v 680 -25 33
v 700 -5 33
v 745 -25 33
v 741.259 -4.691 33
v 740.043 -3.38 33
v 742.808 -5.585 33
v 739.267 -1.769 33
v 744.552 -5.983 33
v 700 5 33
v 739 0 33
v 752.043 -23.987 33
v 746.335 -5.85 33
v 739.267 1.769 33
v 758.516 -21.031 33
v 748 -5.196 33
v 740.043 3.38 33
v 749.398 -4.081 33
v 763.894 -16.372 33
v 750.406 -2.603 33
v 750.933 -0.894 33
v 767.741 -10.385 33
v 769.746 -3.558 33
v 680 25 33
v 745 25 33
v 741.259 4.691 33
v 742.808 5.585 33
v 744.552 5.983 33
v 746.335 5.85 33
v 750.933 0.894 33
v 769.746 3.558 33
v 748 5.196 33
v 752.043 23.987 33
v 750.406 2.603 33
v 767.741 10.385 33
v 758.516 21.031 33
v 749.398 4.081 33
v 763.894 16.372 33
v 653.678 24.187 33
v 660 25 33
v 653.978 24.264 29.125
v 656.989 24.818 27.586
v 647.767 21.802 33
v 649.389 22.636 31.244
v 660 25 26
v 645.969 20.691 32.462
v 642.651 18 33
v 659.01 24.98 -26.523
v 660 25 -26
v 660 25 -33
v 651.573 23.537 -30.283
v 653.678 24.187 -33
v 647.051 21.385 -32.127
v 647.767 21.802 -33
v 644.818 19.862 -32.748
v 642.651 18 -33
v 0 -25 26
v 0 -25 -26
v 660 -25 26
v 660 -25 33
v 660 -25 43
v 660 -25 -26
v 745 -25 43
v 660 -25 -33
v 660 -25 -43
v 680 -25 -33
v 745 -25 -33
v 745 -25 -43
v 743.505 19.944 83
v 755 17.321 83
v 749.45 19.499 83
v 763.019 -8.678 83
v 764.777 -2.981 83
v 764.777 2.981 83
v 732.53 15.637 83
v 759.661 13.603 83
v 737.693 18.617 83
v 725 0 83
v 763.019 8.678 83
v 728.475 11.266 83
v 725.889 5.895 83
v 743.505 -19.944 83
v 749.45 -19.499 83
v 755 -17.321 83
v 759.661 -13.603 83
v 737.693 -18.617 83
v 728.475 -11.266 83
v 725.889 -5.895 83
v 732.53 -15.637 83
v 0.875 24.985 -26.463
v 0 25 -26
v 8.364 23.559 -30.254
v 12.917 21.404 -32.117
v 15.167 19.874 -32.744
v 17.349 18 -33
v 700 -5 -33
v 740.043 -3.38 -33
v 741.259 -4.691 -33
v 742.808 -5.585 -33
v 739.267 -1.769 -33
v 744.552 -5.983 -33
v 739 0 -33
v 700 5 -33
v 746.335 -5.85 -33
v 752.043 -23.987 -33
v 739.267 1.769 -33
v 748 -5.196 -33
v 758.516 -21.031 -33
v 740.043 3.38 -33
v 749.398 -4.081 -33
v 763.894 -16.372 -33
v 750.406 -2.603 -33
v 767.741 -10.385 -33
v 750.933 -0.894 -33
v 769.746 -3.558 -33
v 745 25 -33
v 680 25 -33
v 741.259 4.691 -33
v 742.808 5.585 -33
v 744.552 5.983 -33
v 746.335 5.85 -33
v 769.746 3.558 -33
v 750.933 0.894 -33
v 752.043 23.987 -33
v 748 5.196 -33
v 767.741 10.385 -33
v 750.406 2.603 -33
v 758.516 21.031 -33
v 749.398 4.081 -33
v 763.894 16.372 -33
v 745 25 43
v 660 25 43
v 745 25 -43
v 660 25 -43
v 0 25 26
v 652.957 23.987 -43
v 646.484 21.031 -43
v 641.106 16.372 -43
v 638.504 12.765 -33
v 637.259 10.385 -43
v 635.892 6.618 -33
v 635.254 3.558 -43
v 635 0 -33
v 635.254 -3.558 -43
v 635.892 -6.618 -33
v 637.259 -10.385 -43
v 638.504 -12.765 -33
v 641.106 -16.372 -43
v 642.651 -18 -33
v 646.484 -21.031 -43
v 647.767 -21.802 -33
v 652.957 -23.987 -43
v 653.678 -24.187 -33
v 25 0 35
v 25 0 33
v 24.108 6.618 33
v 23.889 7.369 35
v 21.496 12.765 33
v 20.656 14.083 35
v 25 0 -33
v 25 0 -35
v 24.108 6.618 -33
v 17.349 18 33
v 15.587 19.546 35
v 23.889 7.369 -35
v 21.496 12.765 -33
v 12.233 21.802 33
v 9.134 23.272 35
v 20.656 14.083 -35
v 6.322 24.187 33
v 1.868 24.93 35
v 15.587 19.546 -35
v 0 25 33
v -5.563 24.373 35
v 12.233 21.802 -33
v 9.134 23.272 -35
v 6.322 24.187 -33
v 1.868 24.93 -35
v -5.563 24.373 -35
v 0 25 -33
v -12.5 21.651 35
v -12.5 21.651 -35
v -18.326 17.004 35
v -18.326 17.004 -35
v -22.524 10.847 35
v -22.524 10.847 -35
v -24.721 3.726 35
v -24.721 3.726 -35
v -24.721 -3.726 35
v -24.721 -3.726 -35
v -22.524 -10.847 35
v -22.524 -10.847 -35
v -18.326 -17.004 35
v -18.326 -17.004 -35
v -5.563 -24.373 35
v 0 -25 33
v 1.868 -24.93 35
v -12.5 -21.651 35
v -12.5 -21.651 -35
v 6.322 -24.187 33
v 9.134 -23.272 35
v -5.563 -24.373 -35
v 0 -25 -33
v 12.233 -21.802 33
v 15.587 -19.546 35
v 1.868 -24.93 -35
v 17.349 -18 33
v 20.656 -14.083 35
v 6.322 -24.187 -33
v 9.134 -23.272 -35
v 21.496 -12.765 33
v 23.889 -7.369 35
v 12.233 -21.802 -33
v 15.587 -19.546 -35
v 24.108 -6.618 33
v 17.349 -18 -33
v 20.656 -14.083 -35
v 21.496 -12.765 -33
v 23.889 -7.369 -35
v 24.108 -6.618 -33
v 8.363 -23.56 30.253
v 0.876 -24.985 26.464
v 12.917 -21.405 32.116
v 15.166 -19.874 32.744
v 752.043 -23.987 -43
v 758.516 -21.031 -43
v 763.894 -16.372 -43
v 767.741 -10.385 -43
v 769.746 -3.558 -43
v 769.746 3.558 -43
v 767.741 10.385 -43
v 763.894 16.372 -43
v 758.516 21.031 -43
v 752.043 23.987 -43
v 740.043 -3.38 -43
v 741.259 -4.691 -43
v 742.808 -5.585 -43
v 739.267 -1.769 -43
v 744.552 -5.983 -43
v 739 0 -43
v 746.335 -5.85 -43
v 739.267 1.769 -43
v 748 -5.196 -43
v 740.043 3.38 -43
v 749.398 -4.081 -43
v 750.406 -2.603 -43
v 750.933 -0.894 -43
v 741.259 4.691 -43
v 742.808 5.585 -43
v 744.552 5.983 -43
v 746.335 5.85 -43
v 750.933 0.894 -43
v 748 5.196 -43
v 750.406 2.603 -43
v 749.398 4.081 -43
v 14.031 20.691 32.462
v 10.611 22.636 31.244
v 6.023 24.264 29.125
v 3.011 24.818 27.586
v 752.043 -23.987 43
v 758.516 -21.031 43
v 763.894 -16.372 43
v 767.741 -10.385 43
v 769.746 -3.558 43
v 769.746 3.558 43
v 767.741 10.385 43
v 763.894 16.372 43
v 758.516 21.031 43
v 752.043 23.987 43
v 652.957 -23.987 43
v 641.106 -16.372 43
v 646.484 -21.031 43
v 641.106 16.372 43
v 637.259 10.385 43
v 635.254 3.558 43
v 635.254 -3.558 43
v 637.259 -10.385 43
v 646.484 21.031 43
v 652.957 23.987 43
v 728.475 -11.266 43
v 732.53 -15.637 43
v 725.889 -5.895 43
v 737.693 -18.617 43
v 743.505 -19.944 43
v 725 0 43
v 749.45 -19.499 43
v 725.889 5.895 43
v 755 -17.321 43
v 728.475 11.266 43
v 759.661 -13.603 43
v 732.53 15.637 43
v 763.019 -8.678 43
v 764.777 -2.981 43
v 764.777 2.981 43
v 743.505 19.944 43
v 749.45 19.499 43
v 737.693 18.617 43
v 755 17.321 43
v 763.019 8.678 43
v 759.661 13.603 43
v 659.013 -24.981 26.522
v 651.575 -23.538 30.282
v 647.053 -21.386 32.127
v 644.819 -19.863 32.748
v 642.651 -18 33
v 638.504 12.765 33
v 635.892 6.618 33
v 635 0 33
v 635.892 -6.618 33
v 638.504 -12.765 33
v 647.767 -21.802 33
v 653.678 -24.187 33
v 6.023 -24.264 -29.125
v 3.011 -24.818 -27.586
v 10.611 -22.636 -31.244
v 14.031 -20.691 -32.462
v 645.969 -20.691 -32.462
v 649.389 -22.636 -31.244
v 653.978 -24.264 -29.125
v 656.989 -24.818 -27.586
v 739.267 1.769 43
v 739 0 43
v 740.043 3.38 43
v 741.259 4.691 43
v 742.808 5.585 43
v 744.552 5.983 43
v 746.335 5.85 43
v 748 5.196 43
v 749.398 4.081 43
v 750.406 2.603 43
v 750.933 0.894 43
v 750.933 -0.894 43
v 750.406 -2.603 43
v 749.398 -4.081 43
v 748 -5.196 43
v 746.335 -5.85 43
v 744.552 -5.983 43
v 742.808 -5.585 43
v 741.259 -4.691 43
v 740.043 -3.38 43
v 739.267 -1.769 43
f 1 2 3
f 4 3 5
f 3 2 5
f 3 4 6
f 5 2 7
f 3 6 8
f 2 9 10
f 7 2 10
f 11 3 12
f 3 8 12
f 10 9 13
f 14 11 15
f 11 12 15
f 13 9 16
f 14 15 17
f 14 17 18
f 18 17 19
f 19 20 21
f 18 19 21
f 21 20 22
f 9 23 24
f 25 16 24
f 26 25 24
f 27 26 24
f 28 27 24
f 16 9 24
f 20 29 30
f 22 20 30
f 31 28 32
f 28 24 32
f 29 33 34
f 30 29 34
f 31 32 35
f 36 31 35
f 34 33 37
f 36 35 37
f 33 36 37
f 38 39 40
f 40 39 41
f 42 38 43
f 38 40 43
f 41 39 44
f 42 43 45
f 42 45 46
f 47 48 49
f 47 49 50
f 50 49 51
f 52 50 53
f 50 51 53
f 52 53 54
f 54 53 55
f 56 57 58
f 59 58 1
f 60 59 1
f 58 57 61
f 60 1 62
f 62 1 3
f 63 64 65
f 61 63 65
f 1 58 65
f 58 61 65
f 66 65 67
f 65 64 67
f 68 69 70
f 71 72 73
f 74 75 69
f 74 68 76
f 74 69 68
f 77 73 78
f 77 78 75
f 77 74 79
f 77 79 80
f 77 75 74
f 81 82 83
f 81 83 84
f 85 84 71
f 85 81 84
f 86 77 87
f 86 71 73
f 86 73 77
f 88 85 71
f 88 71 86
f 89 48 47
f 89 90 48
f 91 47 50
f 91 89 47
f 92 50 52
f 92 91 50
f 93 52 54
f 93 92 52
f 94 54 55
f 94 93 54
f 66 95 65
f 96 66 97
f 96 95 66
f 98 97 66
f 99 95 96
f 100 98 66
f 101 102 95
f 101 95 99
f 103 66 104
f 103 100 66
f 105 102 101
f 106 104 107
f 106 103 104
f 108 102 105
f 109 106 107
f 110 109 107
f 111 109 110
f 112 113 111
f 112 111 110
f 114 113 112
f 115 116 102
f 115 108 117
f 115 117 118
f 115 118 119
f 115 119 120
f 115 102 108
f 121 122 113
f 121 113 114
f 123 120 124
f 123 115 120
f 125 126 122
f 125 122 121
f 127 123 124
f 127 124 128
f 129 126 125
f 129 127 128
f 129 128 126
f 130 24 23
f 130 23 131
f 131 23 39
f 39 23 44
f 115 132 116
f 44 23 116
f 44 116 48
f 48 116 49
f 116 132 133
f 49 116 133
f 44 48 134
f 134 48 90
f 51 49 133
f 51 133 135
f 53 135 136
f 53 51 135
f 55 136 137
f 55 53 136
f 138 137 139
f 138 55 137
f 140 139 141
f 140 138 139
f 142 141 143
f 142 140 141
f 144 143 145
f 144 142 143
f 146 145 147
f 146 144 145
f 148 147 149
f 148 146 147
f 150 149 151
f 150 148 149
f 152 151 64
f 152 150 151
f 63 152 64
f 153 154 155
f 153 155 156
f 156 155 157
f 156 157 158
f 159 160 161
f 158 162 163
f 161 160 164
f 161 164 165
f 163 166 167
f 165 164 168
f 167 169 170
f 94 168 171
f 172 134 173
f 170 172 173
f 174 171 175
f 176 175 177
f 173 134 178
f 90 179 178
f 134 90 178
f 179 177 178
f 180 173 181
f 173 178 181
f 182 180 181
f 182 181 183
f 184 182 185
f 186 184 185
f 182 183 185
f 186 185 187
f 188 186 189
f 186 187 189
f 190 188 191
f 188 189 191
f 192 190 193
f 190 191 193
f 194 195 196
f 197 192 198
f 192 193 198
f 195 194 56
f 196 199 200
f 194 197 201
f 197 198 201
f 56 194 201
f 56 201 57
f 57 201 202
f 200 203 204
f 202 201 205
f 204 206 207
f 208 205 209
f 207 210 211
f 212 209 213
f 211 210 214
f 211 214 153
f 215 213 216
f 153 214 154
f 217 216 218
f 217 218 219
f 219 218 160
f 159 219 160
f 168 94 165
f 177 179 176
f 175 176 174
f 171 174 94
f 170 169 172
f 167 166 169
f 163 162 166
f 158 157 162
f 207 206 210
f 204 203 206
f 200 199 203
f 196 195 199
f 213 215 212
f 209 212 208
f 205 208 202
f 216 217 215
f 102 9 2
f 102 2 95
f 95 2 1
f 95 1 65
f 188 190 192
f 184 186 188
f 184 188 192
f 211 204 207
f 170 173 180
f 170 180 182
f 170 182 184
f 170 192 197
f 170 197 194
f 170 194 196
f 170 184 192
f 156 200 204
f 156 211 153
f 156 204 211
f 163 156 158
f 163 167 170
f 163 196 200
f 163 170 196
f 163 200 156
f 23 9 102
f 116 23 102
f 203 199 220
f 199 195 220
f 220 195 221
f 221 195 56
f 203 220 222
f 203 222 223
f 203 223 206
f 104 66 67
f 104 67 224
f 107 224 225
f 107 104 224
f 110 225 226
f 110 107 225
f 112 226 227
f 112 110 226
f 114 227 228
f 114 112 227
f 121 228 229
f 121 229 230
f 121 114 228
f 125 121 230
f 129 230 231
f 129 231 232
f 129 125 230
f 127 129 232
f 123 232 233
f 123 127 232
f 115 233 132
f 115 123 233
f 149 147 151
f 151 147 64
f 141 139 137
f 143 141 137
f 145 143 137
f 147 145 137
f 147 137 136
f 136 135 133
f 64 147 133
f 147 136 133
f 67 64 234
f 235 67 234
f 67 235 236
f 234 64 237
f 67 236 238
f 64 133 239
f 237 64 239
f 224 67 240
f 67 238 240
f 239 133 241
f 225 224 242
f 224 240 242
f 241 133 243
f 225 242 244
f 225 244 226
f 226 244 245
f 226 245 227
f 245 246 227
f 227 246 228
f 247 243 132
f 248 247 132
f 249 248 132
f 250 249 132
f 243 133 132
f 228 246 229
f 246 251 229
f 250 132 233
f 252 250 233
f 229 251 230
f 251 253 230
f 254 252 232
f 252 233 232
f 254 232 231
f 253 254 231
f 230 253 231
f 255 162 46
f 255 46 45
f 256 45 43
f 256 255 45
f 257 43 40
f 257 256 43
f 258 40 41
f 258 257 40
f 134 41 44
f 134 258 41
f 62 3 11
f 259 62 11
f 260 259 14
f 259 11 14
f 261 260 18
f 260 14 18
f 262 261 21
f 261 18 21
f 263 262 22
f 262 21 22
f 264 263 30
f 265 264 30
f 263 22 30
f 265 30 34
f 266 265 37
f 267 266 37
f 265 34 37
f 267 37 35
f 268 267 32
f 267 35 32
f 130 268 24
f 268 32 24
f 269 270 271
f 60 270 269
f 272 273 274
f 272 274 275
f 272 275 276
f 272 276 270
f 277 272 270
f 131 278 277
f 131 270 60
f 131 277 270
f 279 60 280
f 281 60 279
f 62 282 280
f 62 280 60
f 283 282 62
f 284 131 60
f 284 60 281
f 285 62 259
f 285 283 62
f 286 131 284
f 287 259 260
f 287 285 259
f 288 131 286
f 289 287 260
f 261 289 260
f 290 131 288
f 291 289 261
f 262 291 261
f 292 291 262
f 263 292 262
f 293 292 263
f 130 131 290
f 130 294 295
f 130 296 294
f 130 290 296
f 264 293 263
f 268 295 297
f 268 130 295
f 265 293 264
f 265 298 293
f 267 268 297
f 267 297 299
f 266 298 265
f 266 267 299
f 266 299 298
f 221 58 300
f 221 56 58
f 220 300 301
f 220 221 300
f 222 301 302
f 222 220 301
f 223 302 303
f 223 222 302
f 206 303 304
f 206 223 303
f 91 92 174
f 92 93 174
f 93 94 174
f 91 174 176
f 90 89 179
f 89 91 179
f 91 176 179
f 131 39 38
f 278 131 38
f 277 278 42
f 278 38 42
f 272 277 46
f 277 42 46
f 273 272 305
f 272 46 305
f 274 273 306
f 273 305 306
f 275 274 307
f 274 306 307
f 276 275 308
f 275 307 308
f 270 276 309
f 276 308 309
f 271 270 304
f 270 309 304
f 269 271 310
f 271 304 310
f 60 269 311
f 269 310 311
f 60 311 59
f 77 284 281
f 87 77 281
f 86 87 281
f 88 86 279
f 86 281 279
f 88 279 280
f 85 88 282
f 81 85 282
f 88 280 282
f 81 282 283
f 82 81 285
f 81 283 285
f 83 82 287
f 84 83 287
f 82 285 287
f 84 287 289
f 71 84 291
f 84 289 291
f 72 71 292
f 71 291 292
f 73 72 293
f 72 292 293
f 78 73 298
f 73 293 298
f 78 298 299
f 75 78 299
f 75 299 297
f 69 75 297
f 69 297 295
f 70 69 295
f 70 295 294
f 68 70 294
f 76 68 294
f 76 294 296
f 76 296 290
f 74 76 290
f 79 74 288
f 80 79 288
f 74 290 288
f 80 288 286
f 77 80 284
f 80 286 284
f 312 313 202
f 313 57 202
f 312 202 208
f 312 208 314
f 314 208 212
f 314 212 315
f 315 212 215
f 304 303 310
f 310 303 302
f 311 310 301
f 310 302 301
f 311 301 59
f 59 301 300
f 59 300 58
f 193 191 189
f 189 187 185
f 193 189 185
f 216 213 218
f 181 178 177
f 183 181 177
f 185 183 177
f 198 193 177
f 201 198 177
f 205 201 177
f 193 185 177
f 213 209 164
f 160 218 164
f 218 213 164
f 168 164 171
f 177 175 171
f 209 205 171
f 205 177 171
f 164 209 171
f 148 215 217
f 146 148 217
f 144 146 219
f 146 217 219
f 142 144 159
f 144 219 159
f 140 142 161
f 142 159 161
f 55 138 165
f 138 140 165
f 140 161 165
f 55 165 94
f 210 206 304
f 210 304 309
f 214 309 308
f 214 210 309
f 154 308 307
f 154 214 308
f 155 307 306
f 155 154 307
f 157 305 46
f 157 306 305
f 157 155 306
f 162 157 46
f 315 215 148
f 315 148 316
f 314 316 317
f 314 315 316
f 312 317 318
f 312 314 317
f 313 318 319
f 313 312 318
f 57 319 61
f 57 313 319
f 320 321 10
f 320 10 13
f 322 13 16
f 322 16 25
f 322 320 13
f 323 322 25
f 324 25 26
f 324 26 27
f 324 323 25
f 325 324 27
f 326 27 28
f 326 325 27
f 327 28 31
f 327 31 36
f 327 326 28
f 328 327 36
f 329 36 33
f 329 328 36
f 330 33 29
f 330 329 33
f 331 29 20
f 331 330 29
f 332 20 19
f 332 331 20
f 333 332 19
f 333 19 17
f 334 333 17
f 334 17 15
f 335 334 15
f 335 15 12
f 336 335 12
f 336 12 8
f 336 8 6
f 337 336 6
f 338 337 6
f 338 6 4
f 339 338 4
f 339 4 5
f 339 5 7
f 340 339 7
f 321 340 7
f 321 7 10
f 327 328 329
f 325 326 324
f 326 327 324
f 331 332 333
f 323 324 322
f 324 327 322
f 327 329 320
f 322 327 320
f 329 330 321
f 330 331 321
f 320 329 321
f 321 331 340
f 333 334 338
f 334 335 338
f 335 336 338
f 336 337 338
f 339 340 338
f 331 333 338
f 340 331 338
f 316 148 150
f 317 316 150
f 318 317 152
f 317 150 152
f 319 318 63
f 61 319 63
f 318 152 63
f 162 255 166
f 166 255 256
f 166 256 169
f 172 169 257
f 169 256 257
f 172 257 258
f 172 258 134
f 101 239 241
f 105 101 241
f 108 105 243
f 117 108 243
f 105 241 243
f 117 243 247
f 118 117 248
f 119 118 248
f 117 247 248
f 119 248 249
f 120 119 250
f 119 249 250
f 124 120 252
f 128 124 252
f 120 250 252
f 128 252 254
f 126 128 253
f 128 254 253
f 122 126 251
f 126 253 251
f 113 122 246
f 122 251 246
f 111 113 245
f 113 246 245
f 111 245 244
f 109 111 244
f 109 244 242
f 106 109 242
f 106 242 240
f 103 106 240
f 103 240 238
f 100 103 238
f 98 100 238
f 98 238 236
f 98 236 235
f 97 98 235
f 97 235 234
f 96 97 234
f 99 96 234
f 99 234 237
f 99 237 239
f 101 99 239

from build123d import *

# Parameters (mm, degrees)
AUFSATZ_LINEAR_AUSTRAGEN1_DEPTH      = 35
AUFSATZ_LINEAR_AUSTRAGEN1_DEPTH_BACK = 35
SKIZZE1_R                            = 25
SKIZZE2_W                            = 66
SKIZZE2_H                            = 50
AUFSATZ_LINEAR_AUSTRAGEN2_DEPTH      = 700
AUFSATZ_LINEAR_AUSTRAGEN3_DEPTH      = 10
SCHNITT_LINEAR_AUSTRAGEN1_REACH      = 776.344
SKIZZE4_R                            = 6
VERRUNDUNG2_START                    = -1e-07
VERRUNDUNG2_DEPTH                    = 660.0000001
VERRUNDUNG2_START_2                  = -33
VERRUNDUNG2_2_DEPTH                  = 66
FASE1_SIZE                           = 20
SKIZZE5_R                            = 20
AUFSATZ_LINEAR_AUSTRAGEN4_DEPTH      = 40


with BuildPart() as part:
    # Skizze1 → Aufsatz-Linear austragen1 (new, two sides: drawn at the far end of the back side and taken through both)
    with BuildSketch(Plane.XY.offset(-AUFSATZ_LINEAR_AUSTRAGEN1_DEPTH_BACK)):
        Circle(SKIZZE1_R)
    extrude(amount=AUFSATZ_LINEAR_AUSTRAGEN1_DEPTH + AUFSATZ_LINEAR_AUSTRAGEN1_DEPTH_BACK)

    # Skizze2 → Aufsatz-Linear austragen2 (add)
    with BuildSketch(Plane(origin=(0, 0, 0), x_dir=(0, 0, -1), z_dir=(1, 0, 0))):
        Rectangle(SKIZZE2_W, SKIZZE2_H)
    extrude(amount=AUFSATZ_LINEAR_AUSTRAGEN2_DEPTH)

    # Skizze3 → Aufsatz-Linear austragen3 (add)
    with BuildSketch(Plane(origin=(0, 0, -33), x_dir=(-1, 0, 0), z_dir=(0, 0, -1))):
        with BuildLine():
            Line((-700, 25), (-660, 25))
            ThreePointArc((-660, 25), (-635, 0), (-660, -25))
            Line((-660, -25), (-700, -25))
            Line((-700, -25), (-745, -25))
            ThreePointArc((-745, -25), (-770, 0), (-745, 25))
            Line((-745, 25), (-700, 25))
        make_face()
    aufsatz_linear_austragen3 = extrude(amount=AUFSATZ_LINEAR_AUSTRAGEN3_DEPTH)

    # Skizze4 → Schnitt-Linear austragen1 (cut, up to next)
    with BuildSketch(Plane(origin=(0, 0, -43), x_dir=(-1, 0, 0), z_dir=(0, 0, -1)), mode=Mode.PRIVATE) as schnitt_linear_austragen1_sk1:
        with Locations((-745, 0)):
            Circle(SKIZZE4_R)
    schnitt_linear_austragen1_tool1 = extrude(schnitt_linear_austragen1_sk1.sketch, amount=-SCHNITT_LINEAR_AUSTRAGEN1_REACH, mode=Mode.PRIVATE) & part.part
    schnitt_linear_austragen1 = schnitt_linear_austragen1_tool1.solids().sort_by_distance((745, 0, -43))[0]
    add(schnitt_linear_austragen1, mode=Mode.SUBTRACT)

    # Spiegeln1: Aufsatz-Linear austragen3, Schnitt-Linear austragen1 across plane
    add(aufsatz_linear_austragen3.mirror(Plane.XY))
    add(schnitt_linear_austragen1.mirror(Plane.XY), mode=Mode.SUBTRACT)

    # Verrundung2: read off the stored shape, not the designer's step
    # Verrundung2 outline → Verrundung2 (cut)
    with BuildSketch(Plane.YZ.offset(VERRUNDUNG2_START)):
        with BuildLine():
            Line((-25, -33), (-18, -33))
            ThreePointArc((-18, -33), (-22.949747468, -30.949747468), (-25, -26))
            Line((-25, -26), (-25, -33))
        make_face()
        with BuildLine():
            ThreePointArc((25, -26), (22.949747468, -30.949747468), (18, -33))
            Line((18, -33), (25, -33))
            Line((25, -33), (25, -26))
        make_face()
        with BuildLine():
            Line((-25, 33), (-25, 26))
            ThreePointArc((-25, 26), (-22.949747468, 30.949747468), (-18, 33))
            Line((-18, 33), (-25, 33))
        make_face()
        with BuildLine():
            ThreePointArc((18, 33), (22.949747468, 30.949747468), (25, 26))
            Line((25, 26), (25, 33))
            Line((25, 33), (18, 33))
        make_face()
    extrude(amount=VERRUNDUNG2_DEPTH, mode=Mode.SUBTRACT)

    # Verrundung2 2 outline → Verrundung2 2 (add)
    with BuildSketch(Plane.XY.offset(VERRUNDUNG2_START_2)):
        with BuildLine():
            Line((17.349351573, -18), (-1e-07, -18))
            Line((-1e-07, -18), (0, -25))
            ThreePointArc((0, -25), (9.354143467, -23.184046239), (17.349351573, -18))
        make_face()
        with BuildLine():
            Line((660, -18), (642.650648427, -18))
            ThreePointArc((642.650648427, -18), (650.645856533, -23.184046239), (660, -25))
            Line((660, -25), (660, -18))
        make_face()
        with BuildLine():
            Line((660, 18), (660, 25))
            ThreePointArc((660, 25), (650.645856533, 23.184046239), (642.650648427, 18))
            Line((642.650648427, 18), (660, 18))
        make_face()
        with BuildLine():
            ThreePointArc((17.349351573, 18), (9.354143467, 23.184046239), (0, 25))
            Line((0, 25), (-1e-07, 18))
            Line((-1e-07, 18), (17.349351573, 18))
        make_face()
    extrude(amount=VERRUNDUNG2_2_DEPTH)

    # Fase1
    fase1_edges = [part.edges().sort_by_distance(p)[0] for p in [
        (700, -25, 0),
        (700, 25, 0),
    ]]
    chamfer(fase1_edges, length=FASE1_SIZE)

    # Skizze5 → Aufsatz-Linear austragen4 (add)
    with BuildSketch(Plane.XY.offset(43)):
        with Locations(Location((745, 0, 0), (0, 0, 180))):
            Circle(SKIZZE5_R)
    extrude(amount=AUFSATZ_LINEAR_AUSTRAGEN4_DEPTH)


solid = part.part
